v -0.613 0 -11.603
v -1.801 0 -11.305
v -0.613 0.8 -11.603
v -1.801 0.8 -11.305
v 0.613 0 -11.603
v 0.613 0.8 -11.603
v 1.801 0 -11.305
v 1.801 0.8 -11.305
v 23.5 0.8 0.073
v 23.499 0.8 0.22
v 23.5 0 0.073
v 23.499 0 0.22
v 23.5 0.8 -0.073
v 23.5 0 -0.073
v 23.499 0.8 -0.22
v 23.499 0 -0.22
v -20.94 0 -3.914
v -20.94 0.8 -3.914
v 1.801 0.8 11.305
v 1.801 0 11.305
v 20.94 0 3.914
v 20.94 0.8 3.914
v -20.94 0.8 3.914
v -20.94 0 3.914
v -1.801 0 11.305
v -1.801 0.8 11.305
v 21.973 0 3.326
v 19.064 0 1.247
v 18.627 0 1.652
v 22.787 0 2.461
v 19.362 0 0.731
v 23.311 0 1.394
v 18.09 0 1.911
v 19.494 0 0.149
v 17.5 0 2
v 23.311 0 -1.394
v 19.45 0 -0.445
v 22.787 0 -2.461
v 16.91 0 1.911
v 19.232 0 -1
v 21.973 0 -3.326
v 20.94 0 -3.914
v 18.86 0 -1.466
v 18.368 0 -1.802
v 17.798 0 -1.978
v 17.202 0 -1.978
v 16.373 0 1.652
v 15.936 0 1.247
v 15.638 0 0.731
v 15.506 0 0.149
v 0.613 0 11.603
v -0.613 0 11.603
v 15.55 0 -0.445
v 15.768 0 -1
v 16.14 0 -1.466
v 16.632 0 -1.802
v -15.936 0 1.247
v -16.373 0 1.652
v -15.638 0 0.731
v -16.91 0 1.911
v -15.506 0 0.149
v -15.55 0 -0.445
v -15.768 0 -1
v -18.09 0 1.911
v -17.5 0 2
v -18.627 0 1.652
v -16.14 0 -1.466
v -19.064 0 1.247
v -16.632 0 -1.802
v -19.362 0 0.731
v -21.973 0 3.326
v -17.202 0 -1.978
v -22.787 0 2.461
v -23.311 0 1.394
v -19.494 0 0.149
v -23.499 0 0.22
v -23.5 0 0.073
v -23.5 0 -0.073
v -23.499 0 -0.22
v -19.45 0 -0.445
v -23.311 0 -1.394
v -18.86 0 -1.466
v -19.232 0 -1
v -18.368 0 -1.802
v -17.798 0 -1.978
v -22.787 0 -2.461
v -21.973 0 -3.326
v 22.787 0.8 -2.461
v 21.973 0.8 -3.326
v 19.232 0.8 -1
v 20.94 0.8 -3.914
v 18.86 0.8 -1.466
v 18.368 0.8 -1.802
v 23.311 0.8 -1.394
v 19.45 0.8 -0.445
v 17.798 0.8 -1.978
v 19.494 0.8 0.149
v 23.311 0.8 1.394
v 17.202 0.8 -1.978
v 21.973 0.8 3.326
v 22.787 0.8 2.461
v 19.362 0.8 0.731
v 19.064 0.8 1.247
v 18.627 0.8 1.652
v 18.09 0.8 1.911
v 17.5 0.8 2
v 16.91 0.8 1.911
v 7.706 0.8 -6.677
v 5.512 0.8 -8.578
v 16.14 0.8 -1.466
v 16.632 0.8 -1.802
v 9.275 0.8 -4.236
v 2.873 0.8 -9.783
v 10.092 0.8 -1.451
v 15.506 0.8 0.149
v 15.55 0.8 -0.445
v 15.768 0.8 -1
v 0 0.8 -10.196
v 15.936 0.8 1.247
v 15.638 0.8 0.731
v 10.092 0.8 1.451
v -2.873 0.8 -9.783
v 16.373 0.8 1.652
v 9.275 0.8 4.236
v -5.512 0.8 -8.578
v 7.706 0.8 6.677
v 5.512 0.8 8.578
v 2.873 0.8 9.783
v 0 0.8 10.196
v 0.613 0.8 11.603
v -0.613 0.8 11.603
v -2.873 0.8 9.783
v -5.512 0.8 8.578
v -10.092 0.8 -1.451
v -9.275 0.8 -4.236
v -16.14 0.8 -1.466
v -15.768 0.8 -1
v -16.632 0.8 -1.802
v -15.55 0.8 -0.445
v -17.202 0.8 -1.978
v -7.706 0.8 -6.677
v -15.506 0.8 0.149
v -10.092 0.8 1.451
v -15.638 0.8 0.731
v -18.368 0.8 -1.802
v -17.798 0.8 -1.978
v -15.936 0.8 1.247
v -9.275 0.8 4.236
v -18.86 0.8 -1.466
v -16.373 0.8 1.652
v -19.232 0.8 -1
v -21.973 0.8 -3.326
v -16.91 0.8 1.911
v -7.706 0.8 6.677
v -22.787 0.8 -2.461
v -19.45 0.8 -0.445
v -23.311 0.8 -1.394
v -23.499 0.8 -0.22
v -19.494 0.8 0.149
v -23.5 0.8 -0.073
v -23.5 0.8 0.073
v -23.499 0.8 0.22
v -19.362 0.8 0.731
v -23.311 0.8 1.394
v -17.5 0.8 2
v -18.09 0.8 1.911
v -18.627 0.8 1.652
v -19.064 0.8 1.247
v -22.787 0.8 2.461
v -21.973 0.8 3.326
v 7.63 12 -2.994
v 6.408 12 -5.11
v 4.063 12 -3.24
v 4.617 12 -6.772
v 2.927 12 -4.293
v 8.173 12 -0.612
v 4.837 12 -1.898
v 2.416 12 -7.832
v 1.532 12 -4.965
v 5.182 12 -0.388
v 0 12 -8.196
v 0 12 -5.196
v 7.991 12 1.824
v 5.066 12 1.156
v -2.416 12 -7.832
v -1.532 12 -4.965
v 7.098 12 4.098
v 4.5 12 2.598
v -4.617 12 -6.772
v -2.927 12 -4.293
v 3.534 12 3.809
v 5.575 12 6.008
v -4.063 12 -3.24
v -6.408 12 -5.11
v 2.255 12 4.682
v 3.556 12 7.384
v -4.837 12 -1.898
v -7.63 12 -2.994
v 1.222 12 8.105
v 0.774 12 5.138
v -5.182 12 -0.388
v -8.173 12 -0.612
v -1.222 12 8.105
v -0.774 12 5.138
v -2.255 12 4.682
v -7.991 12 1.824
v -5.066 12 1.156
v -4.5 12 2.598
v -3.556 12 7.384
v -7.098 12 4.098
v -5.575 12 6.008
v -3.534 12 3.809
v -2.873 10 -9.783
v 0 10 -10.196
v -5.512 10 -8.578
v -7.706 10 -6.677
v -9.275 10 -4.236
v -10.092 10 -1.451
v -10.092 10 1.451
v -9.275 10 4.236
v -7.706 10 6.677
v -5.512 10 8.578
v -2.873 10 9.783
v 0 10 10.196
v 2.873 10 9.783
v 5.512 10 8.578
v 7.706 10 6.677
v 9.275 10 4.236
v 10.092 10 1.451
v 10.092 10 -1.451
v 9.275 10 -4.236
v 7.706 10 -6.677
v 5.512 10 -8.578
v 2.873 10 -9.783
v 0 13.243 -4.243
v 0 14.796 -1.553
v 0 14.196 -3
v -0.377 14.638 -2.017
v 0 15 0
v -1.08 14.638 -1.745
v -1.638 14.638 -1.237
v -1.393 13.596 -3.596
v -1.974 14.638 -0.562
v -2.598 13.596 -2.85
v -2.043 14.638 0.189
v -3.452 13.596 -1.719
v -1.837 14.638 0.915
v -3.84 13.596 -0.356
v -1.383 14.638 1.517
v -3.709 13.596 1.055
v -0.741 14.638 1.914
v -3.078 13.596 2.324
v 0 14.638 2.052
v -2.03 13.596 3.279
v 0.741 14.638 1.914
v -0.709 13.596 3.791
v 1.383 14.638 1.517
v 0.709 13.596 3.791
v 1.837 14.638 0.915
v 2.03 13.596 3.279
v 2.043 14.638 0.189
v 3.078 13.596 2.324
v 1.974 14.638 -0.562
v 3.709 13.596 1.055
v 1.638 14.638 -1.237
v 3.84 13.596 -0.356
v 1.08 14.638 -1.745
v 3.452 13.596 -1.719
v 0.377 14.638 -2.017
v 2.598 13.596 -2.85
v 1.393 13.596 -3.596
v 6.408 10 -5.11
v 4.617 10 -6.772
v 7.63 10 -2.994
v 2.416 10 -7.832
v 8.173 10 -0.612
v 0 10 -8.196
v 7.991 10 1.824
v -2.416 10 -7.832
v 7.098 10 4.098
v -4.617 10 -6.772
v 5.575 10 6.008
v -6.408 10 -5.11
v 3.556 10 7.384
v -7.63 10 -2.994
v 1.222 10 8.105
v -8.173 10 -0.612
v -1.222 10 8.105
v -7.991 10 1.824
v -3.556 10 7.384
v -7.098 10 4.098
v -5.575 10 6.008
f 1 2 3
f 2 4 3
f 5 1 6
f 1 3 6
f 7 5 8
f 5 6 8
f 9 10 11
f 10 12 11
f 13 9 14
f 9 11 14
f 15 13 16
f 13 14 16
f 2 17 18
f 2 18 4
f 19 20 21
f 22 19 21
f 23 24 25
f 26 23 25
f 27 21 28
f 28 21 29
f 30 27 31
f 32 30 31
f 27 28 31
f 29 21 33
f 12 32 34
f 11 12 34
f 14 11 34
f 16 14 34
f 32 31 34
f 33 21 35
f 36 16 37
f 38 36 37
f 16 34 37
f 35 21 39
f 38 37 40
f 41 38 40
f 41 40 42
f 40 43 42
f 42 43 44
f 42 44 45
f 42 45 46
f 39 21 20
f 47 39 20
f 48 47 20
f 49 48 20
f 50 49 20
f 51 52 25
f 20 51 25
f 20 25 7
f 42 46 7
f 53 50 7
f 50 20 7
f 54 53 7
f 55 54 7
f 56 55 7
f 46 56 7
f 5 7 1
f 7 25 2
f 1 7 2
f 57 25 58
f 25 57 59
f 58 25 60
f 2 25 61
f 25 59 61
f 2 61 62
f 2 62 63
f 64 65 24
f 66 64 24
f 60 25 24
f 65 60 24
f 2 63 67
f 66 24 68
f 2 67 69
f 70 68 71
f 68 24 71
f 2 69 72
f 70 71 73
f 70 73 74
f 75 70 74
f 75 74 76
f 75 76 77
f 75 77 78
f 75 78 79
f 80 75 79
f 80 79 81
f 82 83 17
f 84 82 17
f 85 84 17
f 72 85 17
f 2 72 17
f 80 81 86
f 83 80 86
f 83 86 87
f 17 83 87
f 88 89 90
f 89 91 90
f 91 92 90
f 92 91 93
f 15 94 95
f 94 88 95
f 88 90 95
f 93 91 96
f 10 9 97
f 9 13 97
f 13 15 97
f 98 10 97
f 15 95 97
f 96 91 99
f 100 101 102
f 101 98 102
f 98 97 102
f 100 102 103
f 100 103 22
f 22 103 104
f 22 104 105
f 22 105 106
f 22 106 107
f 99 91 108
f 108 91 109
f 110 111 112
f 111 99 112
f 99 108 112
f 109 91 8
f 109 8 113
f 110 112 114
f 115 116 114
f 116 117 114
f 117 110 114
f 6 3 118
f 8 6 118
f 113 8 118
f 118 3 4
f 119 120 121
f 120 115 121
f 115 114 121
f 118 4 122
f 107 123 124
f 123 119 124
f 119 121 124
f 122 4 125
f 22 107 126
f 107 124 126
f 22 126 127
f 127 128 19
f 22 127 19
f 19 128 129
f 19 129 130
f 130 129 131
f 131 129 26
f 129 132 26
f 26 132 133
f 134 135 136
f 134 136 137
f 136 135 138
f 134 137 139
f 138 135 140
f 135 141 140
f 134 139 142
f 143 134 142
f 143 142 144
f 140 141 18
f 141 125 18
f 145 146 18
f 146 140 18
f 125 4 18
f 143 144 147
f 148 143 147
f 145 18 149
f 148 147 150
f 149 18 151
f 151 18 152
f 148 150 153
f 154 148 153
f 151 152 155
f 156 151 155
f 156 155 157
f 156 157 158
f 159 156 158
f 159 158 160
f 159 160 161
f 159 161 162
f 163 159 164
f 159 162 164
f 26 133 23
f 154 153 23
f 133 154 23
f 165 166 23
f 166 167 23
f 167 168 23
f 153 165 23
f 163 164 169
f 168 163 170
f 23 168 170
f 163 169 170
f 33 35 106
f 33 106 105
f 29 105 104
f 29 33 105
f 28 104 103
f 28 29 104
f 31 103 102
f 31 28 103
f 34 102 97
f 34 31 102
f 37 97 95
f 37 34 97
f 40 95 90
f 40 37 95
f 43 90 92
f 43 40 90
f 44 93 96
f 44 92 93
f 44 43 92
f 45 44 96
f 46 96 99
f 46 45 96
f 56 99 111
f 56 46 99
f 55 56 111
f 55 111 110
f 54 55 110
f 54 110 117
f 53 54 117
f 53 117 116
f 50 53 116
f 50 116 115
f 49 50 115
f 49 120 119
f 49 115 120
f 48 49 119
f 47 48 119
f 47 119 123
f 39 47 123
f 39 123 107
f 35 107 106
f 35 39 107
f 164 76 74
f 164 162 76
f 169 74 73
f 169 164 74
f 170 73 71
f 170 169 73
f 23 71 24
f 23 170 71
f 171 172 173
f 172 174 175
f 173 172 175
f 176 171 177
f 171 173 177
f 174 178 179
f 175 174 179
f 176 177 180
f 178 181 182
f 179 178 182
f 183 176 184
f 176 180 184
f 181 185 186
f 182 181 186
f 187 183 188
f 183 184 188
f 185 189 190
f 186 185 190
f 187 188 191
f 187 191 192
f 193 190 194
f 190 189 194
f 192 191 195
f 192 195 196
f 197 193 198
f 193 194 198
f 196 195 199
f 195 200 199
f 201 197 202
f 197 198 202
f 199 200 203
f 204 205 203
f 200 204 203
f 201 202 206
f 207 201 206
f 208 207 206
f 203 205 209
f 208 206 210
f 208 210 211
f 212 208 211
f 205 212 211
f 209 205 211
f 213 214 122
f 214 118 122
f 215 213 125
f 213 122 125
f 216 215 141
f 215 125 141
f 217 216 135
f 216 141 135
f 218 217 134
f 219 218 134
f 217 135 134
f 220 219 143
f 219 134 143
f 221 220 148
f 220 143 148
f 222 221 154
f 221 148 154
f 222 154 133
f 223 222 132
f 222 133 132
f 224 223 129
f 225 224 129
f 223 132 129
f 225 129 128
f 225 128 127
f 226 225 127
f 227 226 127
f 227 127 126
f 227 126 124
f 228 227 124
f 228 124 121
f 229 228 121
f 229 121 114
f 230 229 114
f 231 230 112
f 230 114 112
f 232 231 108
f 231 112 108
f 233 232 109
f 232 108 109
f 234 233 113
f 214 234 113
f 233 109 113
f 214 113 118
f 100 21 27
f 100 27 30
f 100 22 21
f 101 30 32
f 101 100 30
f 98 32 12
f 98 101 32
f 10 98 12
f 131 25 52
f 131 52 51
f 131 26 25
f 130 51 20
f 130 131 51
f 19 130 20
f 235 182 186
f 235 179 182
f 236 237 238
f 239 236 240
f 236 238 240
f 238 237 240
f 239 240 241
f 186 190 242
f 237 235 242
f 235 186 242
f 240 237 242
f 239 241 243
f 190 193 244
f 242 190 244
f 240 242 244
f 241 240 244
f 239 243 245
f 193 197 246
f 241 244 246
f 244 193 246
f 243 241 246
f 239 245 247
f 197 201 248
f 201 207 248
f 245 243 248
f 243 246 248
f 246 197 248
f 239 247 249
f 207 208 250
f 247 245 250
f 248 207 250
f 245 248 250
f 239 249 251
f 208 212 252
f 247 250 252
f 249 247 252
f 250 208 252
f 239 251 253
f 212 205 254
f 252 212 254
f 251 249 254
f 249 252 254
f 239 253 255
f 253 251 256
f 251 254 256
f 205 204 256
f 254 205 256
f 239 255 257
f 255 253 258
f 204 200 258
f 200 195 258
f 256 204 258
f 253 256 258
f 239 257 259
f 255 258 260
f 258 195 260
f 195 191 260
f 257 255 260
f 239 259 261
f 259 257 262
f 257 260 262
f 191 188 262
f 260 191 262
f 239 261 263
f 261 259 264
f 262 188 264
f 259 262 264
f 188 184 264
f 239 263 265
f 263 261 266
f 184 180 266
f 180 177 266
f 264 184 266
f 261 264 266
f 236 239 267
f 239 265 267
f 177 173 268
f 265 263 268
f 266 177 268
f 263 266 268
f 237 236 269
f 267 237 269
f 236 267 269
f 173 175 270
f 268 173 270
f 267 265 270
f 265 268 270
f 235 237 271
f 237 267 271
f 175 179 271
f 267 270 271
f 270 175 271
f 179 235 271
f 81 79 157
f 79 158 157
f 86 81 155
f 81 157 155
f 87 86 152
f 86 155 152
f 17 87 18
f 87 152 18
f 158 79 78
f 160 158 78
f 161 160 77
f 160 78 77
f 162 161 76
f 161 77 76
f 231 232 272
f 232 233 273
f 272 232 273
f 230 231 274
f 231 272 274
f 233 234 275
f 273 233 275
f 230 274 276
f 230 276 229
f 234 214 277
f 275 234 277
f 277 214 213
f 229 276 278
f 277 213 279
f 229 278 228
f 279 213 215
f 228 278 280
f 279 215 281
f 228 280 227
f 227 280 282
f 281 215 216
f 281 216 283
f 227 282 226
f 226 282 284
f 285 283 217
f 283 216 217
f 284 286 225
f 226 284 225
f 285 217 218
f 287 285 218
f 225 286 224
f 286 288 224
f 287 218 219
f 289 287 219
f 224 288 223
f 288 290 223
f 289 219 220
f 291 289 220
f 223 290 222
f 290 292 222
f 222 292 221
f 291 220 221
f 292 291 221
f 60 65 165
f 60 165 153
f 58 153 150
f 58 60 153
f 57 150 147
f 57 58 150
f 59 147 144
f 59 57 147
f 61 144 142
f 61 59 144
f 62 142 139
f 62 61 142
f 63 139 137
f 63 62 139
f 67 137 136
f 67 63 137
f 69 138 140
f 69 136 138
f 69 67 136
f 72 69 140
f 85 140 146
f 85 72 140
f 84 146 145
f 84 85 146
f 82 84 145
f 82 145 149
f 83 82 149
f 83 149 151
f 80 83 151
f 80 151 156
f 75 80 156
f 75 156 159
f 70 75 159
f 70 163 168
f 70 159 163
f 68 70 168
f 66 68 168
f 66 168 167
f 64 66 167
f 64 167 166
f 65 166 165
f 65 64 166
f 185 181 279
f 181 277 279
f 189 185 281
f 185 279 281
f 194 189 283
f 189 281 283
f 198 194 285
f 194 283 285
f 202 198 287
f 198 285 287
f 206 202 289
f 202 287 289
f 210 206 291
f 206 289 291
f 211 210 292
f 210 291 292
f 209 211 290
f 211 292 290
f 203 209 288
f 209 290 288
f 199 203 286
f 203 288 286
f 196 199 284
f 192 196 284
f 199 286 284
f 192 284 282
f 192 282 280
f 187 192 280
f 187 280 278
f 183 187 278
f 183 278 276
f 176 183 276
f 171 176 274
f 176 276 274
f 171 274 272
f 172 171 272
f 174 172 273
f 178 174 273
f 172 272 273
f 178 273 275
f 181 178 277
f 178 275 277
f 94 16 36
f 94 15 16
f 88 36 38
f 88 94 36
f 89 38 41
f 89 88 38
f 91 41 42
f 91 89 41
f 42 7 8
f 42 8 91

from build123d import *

# Parameters (mm, degrees)
CUT_EXTRUDE3_DEPTH      = 37.462309307
CUT_EXTRUDE3_DEPTH_BACK = 37.462309307
SKETCH2_R               = 2
CUT_EXTRUDE4_DEPTH      = 37.462309307
FILLET1_R               = 4
FILLET2_R               = 5


with BuildPart() as part:
    # Sketch1 → Revolve1 (revolve)
    with BuildSketch(Plane.XY, mode=Mode.PRIVATE) as revolve1_sk:
        with BuildLine():
            Line((-5.196152423, 12), (-8.196152423, 12))
            Line((-8.196152423, 12), (-8.196152423, 10))
            Line((-8.196152423, 10), (-10.196152423, 10))
            Line((-10.196152423, 10), (-10.196152423, 0.8))
            Line((-10.196152423, 0.8), (-23.5, 0.8))
            Line((-23.5, 0.8), (-23.5, 0))
            Line((-23.5, 0), (0, 0))
            Line((0, 0), (0, 15))
            ThreePointArc((0, 15), (-3, 14.196152423), (-5.196152423, 12))
        make_face()
    revolve(revolve1_sk.sketch.rotate(Axis((0, 0, 0), (0, 1, 0)), 270), axis=Axis((0, 0, 0), (0, 1, 0)))

    # Sketch2 → Cut-Extrude3 (cut, two sides: drawn at the far end of the back side and taken through both)
    with BuildSketch(Plane(origin=(0, 0, 0), x_dir=(1, 0, 0), z_dir=(0, 1, 0)).offset(-CUT_EXTRUDE3_DEPTH_BACK)):
        with Locations(Location((-17.5, 0, 0), (0, 0, 270))):
            Circle(SKETCH2_R)
        with Locations(Location((17.5, 0, 0), (0, 0, 270))):
            Circle(SKETCH2_R)
    extrude(amount=CUT_EXTRUDE3_DEPTH + CUT_EXTRUDE3_DEPTH_BACK, mode=Mode.SUBTRACT)

    # Sketch3 → Cut-Extrude4 (cut, through all)
    with BuildSketch(Plane(origin=(0, 0, 0), x_dir=(1, 0, 0), z_dir=(0, 1, 0))):
        with BuildLine():
            Line((-23.307724042, 3), (0, 12))
            Line((0, 12), (23.307724042, 3))
            ThreePointArc((23.307724042, 3), (0, 23.5), (-23.307724042, 3))
        make_face()
        with BuildLine():
            Line((0, -12), (23.307724042, -3))
            ThreePointArc((23.307724042, -3), (0, -23.5), (-23.307724042, -3))
            Line((-23.307724042, -3), (0, -12))
        make_face()
    extrude(amount=CUT_EXTRUDE4_DEPTH, mode=Mode.SUBTRACT)

    # Fillet1
    fillet1_edges = [part.edges().sort_by_distance(p)[0] for p in [
        (23.307724042, 0.4, -3),
        (-23.307724042, 0.4, -3),
        (-23.307724042, 0.4, 3),
        (23.307724042, 0.4, 3),
    ]]
    fillet(fillet1_edges, radius=FILLET1_R)

    # Fillet2
    fillet2_edges = [part.edges().sort_by_distance(p)[0] for p in [
        (0, 0.4, -12),
        (0, 0.4, 12),
    ]]
    fillet(fillet2_edges, radius=FILLET2_R)


solid = part.part
